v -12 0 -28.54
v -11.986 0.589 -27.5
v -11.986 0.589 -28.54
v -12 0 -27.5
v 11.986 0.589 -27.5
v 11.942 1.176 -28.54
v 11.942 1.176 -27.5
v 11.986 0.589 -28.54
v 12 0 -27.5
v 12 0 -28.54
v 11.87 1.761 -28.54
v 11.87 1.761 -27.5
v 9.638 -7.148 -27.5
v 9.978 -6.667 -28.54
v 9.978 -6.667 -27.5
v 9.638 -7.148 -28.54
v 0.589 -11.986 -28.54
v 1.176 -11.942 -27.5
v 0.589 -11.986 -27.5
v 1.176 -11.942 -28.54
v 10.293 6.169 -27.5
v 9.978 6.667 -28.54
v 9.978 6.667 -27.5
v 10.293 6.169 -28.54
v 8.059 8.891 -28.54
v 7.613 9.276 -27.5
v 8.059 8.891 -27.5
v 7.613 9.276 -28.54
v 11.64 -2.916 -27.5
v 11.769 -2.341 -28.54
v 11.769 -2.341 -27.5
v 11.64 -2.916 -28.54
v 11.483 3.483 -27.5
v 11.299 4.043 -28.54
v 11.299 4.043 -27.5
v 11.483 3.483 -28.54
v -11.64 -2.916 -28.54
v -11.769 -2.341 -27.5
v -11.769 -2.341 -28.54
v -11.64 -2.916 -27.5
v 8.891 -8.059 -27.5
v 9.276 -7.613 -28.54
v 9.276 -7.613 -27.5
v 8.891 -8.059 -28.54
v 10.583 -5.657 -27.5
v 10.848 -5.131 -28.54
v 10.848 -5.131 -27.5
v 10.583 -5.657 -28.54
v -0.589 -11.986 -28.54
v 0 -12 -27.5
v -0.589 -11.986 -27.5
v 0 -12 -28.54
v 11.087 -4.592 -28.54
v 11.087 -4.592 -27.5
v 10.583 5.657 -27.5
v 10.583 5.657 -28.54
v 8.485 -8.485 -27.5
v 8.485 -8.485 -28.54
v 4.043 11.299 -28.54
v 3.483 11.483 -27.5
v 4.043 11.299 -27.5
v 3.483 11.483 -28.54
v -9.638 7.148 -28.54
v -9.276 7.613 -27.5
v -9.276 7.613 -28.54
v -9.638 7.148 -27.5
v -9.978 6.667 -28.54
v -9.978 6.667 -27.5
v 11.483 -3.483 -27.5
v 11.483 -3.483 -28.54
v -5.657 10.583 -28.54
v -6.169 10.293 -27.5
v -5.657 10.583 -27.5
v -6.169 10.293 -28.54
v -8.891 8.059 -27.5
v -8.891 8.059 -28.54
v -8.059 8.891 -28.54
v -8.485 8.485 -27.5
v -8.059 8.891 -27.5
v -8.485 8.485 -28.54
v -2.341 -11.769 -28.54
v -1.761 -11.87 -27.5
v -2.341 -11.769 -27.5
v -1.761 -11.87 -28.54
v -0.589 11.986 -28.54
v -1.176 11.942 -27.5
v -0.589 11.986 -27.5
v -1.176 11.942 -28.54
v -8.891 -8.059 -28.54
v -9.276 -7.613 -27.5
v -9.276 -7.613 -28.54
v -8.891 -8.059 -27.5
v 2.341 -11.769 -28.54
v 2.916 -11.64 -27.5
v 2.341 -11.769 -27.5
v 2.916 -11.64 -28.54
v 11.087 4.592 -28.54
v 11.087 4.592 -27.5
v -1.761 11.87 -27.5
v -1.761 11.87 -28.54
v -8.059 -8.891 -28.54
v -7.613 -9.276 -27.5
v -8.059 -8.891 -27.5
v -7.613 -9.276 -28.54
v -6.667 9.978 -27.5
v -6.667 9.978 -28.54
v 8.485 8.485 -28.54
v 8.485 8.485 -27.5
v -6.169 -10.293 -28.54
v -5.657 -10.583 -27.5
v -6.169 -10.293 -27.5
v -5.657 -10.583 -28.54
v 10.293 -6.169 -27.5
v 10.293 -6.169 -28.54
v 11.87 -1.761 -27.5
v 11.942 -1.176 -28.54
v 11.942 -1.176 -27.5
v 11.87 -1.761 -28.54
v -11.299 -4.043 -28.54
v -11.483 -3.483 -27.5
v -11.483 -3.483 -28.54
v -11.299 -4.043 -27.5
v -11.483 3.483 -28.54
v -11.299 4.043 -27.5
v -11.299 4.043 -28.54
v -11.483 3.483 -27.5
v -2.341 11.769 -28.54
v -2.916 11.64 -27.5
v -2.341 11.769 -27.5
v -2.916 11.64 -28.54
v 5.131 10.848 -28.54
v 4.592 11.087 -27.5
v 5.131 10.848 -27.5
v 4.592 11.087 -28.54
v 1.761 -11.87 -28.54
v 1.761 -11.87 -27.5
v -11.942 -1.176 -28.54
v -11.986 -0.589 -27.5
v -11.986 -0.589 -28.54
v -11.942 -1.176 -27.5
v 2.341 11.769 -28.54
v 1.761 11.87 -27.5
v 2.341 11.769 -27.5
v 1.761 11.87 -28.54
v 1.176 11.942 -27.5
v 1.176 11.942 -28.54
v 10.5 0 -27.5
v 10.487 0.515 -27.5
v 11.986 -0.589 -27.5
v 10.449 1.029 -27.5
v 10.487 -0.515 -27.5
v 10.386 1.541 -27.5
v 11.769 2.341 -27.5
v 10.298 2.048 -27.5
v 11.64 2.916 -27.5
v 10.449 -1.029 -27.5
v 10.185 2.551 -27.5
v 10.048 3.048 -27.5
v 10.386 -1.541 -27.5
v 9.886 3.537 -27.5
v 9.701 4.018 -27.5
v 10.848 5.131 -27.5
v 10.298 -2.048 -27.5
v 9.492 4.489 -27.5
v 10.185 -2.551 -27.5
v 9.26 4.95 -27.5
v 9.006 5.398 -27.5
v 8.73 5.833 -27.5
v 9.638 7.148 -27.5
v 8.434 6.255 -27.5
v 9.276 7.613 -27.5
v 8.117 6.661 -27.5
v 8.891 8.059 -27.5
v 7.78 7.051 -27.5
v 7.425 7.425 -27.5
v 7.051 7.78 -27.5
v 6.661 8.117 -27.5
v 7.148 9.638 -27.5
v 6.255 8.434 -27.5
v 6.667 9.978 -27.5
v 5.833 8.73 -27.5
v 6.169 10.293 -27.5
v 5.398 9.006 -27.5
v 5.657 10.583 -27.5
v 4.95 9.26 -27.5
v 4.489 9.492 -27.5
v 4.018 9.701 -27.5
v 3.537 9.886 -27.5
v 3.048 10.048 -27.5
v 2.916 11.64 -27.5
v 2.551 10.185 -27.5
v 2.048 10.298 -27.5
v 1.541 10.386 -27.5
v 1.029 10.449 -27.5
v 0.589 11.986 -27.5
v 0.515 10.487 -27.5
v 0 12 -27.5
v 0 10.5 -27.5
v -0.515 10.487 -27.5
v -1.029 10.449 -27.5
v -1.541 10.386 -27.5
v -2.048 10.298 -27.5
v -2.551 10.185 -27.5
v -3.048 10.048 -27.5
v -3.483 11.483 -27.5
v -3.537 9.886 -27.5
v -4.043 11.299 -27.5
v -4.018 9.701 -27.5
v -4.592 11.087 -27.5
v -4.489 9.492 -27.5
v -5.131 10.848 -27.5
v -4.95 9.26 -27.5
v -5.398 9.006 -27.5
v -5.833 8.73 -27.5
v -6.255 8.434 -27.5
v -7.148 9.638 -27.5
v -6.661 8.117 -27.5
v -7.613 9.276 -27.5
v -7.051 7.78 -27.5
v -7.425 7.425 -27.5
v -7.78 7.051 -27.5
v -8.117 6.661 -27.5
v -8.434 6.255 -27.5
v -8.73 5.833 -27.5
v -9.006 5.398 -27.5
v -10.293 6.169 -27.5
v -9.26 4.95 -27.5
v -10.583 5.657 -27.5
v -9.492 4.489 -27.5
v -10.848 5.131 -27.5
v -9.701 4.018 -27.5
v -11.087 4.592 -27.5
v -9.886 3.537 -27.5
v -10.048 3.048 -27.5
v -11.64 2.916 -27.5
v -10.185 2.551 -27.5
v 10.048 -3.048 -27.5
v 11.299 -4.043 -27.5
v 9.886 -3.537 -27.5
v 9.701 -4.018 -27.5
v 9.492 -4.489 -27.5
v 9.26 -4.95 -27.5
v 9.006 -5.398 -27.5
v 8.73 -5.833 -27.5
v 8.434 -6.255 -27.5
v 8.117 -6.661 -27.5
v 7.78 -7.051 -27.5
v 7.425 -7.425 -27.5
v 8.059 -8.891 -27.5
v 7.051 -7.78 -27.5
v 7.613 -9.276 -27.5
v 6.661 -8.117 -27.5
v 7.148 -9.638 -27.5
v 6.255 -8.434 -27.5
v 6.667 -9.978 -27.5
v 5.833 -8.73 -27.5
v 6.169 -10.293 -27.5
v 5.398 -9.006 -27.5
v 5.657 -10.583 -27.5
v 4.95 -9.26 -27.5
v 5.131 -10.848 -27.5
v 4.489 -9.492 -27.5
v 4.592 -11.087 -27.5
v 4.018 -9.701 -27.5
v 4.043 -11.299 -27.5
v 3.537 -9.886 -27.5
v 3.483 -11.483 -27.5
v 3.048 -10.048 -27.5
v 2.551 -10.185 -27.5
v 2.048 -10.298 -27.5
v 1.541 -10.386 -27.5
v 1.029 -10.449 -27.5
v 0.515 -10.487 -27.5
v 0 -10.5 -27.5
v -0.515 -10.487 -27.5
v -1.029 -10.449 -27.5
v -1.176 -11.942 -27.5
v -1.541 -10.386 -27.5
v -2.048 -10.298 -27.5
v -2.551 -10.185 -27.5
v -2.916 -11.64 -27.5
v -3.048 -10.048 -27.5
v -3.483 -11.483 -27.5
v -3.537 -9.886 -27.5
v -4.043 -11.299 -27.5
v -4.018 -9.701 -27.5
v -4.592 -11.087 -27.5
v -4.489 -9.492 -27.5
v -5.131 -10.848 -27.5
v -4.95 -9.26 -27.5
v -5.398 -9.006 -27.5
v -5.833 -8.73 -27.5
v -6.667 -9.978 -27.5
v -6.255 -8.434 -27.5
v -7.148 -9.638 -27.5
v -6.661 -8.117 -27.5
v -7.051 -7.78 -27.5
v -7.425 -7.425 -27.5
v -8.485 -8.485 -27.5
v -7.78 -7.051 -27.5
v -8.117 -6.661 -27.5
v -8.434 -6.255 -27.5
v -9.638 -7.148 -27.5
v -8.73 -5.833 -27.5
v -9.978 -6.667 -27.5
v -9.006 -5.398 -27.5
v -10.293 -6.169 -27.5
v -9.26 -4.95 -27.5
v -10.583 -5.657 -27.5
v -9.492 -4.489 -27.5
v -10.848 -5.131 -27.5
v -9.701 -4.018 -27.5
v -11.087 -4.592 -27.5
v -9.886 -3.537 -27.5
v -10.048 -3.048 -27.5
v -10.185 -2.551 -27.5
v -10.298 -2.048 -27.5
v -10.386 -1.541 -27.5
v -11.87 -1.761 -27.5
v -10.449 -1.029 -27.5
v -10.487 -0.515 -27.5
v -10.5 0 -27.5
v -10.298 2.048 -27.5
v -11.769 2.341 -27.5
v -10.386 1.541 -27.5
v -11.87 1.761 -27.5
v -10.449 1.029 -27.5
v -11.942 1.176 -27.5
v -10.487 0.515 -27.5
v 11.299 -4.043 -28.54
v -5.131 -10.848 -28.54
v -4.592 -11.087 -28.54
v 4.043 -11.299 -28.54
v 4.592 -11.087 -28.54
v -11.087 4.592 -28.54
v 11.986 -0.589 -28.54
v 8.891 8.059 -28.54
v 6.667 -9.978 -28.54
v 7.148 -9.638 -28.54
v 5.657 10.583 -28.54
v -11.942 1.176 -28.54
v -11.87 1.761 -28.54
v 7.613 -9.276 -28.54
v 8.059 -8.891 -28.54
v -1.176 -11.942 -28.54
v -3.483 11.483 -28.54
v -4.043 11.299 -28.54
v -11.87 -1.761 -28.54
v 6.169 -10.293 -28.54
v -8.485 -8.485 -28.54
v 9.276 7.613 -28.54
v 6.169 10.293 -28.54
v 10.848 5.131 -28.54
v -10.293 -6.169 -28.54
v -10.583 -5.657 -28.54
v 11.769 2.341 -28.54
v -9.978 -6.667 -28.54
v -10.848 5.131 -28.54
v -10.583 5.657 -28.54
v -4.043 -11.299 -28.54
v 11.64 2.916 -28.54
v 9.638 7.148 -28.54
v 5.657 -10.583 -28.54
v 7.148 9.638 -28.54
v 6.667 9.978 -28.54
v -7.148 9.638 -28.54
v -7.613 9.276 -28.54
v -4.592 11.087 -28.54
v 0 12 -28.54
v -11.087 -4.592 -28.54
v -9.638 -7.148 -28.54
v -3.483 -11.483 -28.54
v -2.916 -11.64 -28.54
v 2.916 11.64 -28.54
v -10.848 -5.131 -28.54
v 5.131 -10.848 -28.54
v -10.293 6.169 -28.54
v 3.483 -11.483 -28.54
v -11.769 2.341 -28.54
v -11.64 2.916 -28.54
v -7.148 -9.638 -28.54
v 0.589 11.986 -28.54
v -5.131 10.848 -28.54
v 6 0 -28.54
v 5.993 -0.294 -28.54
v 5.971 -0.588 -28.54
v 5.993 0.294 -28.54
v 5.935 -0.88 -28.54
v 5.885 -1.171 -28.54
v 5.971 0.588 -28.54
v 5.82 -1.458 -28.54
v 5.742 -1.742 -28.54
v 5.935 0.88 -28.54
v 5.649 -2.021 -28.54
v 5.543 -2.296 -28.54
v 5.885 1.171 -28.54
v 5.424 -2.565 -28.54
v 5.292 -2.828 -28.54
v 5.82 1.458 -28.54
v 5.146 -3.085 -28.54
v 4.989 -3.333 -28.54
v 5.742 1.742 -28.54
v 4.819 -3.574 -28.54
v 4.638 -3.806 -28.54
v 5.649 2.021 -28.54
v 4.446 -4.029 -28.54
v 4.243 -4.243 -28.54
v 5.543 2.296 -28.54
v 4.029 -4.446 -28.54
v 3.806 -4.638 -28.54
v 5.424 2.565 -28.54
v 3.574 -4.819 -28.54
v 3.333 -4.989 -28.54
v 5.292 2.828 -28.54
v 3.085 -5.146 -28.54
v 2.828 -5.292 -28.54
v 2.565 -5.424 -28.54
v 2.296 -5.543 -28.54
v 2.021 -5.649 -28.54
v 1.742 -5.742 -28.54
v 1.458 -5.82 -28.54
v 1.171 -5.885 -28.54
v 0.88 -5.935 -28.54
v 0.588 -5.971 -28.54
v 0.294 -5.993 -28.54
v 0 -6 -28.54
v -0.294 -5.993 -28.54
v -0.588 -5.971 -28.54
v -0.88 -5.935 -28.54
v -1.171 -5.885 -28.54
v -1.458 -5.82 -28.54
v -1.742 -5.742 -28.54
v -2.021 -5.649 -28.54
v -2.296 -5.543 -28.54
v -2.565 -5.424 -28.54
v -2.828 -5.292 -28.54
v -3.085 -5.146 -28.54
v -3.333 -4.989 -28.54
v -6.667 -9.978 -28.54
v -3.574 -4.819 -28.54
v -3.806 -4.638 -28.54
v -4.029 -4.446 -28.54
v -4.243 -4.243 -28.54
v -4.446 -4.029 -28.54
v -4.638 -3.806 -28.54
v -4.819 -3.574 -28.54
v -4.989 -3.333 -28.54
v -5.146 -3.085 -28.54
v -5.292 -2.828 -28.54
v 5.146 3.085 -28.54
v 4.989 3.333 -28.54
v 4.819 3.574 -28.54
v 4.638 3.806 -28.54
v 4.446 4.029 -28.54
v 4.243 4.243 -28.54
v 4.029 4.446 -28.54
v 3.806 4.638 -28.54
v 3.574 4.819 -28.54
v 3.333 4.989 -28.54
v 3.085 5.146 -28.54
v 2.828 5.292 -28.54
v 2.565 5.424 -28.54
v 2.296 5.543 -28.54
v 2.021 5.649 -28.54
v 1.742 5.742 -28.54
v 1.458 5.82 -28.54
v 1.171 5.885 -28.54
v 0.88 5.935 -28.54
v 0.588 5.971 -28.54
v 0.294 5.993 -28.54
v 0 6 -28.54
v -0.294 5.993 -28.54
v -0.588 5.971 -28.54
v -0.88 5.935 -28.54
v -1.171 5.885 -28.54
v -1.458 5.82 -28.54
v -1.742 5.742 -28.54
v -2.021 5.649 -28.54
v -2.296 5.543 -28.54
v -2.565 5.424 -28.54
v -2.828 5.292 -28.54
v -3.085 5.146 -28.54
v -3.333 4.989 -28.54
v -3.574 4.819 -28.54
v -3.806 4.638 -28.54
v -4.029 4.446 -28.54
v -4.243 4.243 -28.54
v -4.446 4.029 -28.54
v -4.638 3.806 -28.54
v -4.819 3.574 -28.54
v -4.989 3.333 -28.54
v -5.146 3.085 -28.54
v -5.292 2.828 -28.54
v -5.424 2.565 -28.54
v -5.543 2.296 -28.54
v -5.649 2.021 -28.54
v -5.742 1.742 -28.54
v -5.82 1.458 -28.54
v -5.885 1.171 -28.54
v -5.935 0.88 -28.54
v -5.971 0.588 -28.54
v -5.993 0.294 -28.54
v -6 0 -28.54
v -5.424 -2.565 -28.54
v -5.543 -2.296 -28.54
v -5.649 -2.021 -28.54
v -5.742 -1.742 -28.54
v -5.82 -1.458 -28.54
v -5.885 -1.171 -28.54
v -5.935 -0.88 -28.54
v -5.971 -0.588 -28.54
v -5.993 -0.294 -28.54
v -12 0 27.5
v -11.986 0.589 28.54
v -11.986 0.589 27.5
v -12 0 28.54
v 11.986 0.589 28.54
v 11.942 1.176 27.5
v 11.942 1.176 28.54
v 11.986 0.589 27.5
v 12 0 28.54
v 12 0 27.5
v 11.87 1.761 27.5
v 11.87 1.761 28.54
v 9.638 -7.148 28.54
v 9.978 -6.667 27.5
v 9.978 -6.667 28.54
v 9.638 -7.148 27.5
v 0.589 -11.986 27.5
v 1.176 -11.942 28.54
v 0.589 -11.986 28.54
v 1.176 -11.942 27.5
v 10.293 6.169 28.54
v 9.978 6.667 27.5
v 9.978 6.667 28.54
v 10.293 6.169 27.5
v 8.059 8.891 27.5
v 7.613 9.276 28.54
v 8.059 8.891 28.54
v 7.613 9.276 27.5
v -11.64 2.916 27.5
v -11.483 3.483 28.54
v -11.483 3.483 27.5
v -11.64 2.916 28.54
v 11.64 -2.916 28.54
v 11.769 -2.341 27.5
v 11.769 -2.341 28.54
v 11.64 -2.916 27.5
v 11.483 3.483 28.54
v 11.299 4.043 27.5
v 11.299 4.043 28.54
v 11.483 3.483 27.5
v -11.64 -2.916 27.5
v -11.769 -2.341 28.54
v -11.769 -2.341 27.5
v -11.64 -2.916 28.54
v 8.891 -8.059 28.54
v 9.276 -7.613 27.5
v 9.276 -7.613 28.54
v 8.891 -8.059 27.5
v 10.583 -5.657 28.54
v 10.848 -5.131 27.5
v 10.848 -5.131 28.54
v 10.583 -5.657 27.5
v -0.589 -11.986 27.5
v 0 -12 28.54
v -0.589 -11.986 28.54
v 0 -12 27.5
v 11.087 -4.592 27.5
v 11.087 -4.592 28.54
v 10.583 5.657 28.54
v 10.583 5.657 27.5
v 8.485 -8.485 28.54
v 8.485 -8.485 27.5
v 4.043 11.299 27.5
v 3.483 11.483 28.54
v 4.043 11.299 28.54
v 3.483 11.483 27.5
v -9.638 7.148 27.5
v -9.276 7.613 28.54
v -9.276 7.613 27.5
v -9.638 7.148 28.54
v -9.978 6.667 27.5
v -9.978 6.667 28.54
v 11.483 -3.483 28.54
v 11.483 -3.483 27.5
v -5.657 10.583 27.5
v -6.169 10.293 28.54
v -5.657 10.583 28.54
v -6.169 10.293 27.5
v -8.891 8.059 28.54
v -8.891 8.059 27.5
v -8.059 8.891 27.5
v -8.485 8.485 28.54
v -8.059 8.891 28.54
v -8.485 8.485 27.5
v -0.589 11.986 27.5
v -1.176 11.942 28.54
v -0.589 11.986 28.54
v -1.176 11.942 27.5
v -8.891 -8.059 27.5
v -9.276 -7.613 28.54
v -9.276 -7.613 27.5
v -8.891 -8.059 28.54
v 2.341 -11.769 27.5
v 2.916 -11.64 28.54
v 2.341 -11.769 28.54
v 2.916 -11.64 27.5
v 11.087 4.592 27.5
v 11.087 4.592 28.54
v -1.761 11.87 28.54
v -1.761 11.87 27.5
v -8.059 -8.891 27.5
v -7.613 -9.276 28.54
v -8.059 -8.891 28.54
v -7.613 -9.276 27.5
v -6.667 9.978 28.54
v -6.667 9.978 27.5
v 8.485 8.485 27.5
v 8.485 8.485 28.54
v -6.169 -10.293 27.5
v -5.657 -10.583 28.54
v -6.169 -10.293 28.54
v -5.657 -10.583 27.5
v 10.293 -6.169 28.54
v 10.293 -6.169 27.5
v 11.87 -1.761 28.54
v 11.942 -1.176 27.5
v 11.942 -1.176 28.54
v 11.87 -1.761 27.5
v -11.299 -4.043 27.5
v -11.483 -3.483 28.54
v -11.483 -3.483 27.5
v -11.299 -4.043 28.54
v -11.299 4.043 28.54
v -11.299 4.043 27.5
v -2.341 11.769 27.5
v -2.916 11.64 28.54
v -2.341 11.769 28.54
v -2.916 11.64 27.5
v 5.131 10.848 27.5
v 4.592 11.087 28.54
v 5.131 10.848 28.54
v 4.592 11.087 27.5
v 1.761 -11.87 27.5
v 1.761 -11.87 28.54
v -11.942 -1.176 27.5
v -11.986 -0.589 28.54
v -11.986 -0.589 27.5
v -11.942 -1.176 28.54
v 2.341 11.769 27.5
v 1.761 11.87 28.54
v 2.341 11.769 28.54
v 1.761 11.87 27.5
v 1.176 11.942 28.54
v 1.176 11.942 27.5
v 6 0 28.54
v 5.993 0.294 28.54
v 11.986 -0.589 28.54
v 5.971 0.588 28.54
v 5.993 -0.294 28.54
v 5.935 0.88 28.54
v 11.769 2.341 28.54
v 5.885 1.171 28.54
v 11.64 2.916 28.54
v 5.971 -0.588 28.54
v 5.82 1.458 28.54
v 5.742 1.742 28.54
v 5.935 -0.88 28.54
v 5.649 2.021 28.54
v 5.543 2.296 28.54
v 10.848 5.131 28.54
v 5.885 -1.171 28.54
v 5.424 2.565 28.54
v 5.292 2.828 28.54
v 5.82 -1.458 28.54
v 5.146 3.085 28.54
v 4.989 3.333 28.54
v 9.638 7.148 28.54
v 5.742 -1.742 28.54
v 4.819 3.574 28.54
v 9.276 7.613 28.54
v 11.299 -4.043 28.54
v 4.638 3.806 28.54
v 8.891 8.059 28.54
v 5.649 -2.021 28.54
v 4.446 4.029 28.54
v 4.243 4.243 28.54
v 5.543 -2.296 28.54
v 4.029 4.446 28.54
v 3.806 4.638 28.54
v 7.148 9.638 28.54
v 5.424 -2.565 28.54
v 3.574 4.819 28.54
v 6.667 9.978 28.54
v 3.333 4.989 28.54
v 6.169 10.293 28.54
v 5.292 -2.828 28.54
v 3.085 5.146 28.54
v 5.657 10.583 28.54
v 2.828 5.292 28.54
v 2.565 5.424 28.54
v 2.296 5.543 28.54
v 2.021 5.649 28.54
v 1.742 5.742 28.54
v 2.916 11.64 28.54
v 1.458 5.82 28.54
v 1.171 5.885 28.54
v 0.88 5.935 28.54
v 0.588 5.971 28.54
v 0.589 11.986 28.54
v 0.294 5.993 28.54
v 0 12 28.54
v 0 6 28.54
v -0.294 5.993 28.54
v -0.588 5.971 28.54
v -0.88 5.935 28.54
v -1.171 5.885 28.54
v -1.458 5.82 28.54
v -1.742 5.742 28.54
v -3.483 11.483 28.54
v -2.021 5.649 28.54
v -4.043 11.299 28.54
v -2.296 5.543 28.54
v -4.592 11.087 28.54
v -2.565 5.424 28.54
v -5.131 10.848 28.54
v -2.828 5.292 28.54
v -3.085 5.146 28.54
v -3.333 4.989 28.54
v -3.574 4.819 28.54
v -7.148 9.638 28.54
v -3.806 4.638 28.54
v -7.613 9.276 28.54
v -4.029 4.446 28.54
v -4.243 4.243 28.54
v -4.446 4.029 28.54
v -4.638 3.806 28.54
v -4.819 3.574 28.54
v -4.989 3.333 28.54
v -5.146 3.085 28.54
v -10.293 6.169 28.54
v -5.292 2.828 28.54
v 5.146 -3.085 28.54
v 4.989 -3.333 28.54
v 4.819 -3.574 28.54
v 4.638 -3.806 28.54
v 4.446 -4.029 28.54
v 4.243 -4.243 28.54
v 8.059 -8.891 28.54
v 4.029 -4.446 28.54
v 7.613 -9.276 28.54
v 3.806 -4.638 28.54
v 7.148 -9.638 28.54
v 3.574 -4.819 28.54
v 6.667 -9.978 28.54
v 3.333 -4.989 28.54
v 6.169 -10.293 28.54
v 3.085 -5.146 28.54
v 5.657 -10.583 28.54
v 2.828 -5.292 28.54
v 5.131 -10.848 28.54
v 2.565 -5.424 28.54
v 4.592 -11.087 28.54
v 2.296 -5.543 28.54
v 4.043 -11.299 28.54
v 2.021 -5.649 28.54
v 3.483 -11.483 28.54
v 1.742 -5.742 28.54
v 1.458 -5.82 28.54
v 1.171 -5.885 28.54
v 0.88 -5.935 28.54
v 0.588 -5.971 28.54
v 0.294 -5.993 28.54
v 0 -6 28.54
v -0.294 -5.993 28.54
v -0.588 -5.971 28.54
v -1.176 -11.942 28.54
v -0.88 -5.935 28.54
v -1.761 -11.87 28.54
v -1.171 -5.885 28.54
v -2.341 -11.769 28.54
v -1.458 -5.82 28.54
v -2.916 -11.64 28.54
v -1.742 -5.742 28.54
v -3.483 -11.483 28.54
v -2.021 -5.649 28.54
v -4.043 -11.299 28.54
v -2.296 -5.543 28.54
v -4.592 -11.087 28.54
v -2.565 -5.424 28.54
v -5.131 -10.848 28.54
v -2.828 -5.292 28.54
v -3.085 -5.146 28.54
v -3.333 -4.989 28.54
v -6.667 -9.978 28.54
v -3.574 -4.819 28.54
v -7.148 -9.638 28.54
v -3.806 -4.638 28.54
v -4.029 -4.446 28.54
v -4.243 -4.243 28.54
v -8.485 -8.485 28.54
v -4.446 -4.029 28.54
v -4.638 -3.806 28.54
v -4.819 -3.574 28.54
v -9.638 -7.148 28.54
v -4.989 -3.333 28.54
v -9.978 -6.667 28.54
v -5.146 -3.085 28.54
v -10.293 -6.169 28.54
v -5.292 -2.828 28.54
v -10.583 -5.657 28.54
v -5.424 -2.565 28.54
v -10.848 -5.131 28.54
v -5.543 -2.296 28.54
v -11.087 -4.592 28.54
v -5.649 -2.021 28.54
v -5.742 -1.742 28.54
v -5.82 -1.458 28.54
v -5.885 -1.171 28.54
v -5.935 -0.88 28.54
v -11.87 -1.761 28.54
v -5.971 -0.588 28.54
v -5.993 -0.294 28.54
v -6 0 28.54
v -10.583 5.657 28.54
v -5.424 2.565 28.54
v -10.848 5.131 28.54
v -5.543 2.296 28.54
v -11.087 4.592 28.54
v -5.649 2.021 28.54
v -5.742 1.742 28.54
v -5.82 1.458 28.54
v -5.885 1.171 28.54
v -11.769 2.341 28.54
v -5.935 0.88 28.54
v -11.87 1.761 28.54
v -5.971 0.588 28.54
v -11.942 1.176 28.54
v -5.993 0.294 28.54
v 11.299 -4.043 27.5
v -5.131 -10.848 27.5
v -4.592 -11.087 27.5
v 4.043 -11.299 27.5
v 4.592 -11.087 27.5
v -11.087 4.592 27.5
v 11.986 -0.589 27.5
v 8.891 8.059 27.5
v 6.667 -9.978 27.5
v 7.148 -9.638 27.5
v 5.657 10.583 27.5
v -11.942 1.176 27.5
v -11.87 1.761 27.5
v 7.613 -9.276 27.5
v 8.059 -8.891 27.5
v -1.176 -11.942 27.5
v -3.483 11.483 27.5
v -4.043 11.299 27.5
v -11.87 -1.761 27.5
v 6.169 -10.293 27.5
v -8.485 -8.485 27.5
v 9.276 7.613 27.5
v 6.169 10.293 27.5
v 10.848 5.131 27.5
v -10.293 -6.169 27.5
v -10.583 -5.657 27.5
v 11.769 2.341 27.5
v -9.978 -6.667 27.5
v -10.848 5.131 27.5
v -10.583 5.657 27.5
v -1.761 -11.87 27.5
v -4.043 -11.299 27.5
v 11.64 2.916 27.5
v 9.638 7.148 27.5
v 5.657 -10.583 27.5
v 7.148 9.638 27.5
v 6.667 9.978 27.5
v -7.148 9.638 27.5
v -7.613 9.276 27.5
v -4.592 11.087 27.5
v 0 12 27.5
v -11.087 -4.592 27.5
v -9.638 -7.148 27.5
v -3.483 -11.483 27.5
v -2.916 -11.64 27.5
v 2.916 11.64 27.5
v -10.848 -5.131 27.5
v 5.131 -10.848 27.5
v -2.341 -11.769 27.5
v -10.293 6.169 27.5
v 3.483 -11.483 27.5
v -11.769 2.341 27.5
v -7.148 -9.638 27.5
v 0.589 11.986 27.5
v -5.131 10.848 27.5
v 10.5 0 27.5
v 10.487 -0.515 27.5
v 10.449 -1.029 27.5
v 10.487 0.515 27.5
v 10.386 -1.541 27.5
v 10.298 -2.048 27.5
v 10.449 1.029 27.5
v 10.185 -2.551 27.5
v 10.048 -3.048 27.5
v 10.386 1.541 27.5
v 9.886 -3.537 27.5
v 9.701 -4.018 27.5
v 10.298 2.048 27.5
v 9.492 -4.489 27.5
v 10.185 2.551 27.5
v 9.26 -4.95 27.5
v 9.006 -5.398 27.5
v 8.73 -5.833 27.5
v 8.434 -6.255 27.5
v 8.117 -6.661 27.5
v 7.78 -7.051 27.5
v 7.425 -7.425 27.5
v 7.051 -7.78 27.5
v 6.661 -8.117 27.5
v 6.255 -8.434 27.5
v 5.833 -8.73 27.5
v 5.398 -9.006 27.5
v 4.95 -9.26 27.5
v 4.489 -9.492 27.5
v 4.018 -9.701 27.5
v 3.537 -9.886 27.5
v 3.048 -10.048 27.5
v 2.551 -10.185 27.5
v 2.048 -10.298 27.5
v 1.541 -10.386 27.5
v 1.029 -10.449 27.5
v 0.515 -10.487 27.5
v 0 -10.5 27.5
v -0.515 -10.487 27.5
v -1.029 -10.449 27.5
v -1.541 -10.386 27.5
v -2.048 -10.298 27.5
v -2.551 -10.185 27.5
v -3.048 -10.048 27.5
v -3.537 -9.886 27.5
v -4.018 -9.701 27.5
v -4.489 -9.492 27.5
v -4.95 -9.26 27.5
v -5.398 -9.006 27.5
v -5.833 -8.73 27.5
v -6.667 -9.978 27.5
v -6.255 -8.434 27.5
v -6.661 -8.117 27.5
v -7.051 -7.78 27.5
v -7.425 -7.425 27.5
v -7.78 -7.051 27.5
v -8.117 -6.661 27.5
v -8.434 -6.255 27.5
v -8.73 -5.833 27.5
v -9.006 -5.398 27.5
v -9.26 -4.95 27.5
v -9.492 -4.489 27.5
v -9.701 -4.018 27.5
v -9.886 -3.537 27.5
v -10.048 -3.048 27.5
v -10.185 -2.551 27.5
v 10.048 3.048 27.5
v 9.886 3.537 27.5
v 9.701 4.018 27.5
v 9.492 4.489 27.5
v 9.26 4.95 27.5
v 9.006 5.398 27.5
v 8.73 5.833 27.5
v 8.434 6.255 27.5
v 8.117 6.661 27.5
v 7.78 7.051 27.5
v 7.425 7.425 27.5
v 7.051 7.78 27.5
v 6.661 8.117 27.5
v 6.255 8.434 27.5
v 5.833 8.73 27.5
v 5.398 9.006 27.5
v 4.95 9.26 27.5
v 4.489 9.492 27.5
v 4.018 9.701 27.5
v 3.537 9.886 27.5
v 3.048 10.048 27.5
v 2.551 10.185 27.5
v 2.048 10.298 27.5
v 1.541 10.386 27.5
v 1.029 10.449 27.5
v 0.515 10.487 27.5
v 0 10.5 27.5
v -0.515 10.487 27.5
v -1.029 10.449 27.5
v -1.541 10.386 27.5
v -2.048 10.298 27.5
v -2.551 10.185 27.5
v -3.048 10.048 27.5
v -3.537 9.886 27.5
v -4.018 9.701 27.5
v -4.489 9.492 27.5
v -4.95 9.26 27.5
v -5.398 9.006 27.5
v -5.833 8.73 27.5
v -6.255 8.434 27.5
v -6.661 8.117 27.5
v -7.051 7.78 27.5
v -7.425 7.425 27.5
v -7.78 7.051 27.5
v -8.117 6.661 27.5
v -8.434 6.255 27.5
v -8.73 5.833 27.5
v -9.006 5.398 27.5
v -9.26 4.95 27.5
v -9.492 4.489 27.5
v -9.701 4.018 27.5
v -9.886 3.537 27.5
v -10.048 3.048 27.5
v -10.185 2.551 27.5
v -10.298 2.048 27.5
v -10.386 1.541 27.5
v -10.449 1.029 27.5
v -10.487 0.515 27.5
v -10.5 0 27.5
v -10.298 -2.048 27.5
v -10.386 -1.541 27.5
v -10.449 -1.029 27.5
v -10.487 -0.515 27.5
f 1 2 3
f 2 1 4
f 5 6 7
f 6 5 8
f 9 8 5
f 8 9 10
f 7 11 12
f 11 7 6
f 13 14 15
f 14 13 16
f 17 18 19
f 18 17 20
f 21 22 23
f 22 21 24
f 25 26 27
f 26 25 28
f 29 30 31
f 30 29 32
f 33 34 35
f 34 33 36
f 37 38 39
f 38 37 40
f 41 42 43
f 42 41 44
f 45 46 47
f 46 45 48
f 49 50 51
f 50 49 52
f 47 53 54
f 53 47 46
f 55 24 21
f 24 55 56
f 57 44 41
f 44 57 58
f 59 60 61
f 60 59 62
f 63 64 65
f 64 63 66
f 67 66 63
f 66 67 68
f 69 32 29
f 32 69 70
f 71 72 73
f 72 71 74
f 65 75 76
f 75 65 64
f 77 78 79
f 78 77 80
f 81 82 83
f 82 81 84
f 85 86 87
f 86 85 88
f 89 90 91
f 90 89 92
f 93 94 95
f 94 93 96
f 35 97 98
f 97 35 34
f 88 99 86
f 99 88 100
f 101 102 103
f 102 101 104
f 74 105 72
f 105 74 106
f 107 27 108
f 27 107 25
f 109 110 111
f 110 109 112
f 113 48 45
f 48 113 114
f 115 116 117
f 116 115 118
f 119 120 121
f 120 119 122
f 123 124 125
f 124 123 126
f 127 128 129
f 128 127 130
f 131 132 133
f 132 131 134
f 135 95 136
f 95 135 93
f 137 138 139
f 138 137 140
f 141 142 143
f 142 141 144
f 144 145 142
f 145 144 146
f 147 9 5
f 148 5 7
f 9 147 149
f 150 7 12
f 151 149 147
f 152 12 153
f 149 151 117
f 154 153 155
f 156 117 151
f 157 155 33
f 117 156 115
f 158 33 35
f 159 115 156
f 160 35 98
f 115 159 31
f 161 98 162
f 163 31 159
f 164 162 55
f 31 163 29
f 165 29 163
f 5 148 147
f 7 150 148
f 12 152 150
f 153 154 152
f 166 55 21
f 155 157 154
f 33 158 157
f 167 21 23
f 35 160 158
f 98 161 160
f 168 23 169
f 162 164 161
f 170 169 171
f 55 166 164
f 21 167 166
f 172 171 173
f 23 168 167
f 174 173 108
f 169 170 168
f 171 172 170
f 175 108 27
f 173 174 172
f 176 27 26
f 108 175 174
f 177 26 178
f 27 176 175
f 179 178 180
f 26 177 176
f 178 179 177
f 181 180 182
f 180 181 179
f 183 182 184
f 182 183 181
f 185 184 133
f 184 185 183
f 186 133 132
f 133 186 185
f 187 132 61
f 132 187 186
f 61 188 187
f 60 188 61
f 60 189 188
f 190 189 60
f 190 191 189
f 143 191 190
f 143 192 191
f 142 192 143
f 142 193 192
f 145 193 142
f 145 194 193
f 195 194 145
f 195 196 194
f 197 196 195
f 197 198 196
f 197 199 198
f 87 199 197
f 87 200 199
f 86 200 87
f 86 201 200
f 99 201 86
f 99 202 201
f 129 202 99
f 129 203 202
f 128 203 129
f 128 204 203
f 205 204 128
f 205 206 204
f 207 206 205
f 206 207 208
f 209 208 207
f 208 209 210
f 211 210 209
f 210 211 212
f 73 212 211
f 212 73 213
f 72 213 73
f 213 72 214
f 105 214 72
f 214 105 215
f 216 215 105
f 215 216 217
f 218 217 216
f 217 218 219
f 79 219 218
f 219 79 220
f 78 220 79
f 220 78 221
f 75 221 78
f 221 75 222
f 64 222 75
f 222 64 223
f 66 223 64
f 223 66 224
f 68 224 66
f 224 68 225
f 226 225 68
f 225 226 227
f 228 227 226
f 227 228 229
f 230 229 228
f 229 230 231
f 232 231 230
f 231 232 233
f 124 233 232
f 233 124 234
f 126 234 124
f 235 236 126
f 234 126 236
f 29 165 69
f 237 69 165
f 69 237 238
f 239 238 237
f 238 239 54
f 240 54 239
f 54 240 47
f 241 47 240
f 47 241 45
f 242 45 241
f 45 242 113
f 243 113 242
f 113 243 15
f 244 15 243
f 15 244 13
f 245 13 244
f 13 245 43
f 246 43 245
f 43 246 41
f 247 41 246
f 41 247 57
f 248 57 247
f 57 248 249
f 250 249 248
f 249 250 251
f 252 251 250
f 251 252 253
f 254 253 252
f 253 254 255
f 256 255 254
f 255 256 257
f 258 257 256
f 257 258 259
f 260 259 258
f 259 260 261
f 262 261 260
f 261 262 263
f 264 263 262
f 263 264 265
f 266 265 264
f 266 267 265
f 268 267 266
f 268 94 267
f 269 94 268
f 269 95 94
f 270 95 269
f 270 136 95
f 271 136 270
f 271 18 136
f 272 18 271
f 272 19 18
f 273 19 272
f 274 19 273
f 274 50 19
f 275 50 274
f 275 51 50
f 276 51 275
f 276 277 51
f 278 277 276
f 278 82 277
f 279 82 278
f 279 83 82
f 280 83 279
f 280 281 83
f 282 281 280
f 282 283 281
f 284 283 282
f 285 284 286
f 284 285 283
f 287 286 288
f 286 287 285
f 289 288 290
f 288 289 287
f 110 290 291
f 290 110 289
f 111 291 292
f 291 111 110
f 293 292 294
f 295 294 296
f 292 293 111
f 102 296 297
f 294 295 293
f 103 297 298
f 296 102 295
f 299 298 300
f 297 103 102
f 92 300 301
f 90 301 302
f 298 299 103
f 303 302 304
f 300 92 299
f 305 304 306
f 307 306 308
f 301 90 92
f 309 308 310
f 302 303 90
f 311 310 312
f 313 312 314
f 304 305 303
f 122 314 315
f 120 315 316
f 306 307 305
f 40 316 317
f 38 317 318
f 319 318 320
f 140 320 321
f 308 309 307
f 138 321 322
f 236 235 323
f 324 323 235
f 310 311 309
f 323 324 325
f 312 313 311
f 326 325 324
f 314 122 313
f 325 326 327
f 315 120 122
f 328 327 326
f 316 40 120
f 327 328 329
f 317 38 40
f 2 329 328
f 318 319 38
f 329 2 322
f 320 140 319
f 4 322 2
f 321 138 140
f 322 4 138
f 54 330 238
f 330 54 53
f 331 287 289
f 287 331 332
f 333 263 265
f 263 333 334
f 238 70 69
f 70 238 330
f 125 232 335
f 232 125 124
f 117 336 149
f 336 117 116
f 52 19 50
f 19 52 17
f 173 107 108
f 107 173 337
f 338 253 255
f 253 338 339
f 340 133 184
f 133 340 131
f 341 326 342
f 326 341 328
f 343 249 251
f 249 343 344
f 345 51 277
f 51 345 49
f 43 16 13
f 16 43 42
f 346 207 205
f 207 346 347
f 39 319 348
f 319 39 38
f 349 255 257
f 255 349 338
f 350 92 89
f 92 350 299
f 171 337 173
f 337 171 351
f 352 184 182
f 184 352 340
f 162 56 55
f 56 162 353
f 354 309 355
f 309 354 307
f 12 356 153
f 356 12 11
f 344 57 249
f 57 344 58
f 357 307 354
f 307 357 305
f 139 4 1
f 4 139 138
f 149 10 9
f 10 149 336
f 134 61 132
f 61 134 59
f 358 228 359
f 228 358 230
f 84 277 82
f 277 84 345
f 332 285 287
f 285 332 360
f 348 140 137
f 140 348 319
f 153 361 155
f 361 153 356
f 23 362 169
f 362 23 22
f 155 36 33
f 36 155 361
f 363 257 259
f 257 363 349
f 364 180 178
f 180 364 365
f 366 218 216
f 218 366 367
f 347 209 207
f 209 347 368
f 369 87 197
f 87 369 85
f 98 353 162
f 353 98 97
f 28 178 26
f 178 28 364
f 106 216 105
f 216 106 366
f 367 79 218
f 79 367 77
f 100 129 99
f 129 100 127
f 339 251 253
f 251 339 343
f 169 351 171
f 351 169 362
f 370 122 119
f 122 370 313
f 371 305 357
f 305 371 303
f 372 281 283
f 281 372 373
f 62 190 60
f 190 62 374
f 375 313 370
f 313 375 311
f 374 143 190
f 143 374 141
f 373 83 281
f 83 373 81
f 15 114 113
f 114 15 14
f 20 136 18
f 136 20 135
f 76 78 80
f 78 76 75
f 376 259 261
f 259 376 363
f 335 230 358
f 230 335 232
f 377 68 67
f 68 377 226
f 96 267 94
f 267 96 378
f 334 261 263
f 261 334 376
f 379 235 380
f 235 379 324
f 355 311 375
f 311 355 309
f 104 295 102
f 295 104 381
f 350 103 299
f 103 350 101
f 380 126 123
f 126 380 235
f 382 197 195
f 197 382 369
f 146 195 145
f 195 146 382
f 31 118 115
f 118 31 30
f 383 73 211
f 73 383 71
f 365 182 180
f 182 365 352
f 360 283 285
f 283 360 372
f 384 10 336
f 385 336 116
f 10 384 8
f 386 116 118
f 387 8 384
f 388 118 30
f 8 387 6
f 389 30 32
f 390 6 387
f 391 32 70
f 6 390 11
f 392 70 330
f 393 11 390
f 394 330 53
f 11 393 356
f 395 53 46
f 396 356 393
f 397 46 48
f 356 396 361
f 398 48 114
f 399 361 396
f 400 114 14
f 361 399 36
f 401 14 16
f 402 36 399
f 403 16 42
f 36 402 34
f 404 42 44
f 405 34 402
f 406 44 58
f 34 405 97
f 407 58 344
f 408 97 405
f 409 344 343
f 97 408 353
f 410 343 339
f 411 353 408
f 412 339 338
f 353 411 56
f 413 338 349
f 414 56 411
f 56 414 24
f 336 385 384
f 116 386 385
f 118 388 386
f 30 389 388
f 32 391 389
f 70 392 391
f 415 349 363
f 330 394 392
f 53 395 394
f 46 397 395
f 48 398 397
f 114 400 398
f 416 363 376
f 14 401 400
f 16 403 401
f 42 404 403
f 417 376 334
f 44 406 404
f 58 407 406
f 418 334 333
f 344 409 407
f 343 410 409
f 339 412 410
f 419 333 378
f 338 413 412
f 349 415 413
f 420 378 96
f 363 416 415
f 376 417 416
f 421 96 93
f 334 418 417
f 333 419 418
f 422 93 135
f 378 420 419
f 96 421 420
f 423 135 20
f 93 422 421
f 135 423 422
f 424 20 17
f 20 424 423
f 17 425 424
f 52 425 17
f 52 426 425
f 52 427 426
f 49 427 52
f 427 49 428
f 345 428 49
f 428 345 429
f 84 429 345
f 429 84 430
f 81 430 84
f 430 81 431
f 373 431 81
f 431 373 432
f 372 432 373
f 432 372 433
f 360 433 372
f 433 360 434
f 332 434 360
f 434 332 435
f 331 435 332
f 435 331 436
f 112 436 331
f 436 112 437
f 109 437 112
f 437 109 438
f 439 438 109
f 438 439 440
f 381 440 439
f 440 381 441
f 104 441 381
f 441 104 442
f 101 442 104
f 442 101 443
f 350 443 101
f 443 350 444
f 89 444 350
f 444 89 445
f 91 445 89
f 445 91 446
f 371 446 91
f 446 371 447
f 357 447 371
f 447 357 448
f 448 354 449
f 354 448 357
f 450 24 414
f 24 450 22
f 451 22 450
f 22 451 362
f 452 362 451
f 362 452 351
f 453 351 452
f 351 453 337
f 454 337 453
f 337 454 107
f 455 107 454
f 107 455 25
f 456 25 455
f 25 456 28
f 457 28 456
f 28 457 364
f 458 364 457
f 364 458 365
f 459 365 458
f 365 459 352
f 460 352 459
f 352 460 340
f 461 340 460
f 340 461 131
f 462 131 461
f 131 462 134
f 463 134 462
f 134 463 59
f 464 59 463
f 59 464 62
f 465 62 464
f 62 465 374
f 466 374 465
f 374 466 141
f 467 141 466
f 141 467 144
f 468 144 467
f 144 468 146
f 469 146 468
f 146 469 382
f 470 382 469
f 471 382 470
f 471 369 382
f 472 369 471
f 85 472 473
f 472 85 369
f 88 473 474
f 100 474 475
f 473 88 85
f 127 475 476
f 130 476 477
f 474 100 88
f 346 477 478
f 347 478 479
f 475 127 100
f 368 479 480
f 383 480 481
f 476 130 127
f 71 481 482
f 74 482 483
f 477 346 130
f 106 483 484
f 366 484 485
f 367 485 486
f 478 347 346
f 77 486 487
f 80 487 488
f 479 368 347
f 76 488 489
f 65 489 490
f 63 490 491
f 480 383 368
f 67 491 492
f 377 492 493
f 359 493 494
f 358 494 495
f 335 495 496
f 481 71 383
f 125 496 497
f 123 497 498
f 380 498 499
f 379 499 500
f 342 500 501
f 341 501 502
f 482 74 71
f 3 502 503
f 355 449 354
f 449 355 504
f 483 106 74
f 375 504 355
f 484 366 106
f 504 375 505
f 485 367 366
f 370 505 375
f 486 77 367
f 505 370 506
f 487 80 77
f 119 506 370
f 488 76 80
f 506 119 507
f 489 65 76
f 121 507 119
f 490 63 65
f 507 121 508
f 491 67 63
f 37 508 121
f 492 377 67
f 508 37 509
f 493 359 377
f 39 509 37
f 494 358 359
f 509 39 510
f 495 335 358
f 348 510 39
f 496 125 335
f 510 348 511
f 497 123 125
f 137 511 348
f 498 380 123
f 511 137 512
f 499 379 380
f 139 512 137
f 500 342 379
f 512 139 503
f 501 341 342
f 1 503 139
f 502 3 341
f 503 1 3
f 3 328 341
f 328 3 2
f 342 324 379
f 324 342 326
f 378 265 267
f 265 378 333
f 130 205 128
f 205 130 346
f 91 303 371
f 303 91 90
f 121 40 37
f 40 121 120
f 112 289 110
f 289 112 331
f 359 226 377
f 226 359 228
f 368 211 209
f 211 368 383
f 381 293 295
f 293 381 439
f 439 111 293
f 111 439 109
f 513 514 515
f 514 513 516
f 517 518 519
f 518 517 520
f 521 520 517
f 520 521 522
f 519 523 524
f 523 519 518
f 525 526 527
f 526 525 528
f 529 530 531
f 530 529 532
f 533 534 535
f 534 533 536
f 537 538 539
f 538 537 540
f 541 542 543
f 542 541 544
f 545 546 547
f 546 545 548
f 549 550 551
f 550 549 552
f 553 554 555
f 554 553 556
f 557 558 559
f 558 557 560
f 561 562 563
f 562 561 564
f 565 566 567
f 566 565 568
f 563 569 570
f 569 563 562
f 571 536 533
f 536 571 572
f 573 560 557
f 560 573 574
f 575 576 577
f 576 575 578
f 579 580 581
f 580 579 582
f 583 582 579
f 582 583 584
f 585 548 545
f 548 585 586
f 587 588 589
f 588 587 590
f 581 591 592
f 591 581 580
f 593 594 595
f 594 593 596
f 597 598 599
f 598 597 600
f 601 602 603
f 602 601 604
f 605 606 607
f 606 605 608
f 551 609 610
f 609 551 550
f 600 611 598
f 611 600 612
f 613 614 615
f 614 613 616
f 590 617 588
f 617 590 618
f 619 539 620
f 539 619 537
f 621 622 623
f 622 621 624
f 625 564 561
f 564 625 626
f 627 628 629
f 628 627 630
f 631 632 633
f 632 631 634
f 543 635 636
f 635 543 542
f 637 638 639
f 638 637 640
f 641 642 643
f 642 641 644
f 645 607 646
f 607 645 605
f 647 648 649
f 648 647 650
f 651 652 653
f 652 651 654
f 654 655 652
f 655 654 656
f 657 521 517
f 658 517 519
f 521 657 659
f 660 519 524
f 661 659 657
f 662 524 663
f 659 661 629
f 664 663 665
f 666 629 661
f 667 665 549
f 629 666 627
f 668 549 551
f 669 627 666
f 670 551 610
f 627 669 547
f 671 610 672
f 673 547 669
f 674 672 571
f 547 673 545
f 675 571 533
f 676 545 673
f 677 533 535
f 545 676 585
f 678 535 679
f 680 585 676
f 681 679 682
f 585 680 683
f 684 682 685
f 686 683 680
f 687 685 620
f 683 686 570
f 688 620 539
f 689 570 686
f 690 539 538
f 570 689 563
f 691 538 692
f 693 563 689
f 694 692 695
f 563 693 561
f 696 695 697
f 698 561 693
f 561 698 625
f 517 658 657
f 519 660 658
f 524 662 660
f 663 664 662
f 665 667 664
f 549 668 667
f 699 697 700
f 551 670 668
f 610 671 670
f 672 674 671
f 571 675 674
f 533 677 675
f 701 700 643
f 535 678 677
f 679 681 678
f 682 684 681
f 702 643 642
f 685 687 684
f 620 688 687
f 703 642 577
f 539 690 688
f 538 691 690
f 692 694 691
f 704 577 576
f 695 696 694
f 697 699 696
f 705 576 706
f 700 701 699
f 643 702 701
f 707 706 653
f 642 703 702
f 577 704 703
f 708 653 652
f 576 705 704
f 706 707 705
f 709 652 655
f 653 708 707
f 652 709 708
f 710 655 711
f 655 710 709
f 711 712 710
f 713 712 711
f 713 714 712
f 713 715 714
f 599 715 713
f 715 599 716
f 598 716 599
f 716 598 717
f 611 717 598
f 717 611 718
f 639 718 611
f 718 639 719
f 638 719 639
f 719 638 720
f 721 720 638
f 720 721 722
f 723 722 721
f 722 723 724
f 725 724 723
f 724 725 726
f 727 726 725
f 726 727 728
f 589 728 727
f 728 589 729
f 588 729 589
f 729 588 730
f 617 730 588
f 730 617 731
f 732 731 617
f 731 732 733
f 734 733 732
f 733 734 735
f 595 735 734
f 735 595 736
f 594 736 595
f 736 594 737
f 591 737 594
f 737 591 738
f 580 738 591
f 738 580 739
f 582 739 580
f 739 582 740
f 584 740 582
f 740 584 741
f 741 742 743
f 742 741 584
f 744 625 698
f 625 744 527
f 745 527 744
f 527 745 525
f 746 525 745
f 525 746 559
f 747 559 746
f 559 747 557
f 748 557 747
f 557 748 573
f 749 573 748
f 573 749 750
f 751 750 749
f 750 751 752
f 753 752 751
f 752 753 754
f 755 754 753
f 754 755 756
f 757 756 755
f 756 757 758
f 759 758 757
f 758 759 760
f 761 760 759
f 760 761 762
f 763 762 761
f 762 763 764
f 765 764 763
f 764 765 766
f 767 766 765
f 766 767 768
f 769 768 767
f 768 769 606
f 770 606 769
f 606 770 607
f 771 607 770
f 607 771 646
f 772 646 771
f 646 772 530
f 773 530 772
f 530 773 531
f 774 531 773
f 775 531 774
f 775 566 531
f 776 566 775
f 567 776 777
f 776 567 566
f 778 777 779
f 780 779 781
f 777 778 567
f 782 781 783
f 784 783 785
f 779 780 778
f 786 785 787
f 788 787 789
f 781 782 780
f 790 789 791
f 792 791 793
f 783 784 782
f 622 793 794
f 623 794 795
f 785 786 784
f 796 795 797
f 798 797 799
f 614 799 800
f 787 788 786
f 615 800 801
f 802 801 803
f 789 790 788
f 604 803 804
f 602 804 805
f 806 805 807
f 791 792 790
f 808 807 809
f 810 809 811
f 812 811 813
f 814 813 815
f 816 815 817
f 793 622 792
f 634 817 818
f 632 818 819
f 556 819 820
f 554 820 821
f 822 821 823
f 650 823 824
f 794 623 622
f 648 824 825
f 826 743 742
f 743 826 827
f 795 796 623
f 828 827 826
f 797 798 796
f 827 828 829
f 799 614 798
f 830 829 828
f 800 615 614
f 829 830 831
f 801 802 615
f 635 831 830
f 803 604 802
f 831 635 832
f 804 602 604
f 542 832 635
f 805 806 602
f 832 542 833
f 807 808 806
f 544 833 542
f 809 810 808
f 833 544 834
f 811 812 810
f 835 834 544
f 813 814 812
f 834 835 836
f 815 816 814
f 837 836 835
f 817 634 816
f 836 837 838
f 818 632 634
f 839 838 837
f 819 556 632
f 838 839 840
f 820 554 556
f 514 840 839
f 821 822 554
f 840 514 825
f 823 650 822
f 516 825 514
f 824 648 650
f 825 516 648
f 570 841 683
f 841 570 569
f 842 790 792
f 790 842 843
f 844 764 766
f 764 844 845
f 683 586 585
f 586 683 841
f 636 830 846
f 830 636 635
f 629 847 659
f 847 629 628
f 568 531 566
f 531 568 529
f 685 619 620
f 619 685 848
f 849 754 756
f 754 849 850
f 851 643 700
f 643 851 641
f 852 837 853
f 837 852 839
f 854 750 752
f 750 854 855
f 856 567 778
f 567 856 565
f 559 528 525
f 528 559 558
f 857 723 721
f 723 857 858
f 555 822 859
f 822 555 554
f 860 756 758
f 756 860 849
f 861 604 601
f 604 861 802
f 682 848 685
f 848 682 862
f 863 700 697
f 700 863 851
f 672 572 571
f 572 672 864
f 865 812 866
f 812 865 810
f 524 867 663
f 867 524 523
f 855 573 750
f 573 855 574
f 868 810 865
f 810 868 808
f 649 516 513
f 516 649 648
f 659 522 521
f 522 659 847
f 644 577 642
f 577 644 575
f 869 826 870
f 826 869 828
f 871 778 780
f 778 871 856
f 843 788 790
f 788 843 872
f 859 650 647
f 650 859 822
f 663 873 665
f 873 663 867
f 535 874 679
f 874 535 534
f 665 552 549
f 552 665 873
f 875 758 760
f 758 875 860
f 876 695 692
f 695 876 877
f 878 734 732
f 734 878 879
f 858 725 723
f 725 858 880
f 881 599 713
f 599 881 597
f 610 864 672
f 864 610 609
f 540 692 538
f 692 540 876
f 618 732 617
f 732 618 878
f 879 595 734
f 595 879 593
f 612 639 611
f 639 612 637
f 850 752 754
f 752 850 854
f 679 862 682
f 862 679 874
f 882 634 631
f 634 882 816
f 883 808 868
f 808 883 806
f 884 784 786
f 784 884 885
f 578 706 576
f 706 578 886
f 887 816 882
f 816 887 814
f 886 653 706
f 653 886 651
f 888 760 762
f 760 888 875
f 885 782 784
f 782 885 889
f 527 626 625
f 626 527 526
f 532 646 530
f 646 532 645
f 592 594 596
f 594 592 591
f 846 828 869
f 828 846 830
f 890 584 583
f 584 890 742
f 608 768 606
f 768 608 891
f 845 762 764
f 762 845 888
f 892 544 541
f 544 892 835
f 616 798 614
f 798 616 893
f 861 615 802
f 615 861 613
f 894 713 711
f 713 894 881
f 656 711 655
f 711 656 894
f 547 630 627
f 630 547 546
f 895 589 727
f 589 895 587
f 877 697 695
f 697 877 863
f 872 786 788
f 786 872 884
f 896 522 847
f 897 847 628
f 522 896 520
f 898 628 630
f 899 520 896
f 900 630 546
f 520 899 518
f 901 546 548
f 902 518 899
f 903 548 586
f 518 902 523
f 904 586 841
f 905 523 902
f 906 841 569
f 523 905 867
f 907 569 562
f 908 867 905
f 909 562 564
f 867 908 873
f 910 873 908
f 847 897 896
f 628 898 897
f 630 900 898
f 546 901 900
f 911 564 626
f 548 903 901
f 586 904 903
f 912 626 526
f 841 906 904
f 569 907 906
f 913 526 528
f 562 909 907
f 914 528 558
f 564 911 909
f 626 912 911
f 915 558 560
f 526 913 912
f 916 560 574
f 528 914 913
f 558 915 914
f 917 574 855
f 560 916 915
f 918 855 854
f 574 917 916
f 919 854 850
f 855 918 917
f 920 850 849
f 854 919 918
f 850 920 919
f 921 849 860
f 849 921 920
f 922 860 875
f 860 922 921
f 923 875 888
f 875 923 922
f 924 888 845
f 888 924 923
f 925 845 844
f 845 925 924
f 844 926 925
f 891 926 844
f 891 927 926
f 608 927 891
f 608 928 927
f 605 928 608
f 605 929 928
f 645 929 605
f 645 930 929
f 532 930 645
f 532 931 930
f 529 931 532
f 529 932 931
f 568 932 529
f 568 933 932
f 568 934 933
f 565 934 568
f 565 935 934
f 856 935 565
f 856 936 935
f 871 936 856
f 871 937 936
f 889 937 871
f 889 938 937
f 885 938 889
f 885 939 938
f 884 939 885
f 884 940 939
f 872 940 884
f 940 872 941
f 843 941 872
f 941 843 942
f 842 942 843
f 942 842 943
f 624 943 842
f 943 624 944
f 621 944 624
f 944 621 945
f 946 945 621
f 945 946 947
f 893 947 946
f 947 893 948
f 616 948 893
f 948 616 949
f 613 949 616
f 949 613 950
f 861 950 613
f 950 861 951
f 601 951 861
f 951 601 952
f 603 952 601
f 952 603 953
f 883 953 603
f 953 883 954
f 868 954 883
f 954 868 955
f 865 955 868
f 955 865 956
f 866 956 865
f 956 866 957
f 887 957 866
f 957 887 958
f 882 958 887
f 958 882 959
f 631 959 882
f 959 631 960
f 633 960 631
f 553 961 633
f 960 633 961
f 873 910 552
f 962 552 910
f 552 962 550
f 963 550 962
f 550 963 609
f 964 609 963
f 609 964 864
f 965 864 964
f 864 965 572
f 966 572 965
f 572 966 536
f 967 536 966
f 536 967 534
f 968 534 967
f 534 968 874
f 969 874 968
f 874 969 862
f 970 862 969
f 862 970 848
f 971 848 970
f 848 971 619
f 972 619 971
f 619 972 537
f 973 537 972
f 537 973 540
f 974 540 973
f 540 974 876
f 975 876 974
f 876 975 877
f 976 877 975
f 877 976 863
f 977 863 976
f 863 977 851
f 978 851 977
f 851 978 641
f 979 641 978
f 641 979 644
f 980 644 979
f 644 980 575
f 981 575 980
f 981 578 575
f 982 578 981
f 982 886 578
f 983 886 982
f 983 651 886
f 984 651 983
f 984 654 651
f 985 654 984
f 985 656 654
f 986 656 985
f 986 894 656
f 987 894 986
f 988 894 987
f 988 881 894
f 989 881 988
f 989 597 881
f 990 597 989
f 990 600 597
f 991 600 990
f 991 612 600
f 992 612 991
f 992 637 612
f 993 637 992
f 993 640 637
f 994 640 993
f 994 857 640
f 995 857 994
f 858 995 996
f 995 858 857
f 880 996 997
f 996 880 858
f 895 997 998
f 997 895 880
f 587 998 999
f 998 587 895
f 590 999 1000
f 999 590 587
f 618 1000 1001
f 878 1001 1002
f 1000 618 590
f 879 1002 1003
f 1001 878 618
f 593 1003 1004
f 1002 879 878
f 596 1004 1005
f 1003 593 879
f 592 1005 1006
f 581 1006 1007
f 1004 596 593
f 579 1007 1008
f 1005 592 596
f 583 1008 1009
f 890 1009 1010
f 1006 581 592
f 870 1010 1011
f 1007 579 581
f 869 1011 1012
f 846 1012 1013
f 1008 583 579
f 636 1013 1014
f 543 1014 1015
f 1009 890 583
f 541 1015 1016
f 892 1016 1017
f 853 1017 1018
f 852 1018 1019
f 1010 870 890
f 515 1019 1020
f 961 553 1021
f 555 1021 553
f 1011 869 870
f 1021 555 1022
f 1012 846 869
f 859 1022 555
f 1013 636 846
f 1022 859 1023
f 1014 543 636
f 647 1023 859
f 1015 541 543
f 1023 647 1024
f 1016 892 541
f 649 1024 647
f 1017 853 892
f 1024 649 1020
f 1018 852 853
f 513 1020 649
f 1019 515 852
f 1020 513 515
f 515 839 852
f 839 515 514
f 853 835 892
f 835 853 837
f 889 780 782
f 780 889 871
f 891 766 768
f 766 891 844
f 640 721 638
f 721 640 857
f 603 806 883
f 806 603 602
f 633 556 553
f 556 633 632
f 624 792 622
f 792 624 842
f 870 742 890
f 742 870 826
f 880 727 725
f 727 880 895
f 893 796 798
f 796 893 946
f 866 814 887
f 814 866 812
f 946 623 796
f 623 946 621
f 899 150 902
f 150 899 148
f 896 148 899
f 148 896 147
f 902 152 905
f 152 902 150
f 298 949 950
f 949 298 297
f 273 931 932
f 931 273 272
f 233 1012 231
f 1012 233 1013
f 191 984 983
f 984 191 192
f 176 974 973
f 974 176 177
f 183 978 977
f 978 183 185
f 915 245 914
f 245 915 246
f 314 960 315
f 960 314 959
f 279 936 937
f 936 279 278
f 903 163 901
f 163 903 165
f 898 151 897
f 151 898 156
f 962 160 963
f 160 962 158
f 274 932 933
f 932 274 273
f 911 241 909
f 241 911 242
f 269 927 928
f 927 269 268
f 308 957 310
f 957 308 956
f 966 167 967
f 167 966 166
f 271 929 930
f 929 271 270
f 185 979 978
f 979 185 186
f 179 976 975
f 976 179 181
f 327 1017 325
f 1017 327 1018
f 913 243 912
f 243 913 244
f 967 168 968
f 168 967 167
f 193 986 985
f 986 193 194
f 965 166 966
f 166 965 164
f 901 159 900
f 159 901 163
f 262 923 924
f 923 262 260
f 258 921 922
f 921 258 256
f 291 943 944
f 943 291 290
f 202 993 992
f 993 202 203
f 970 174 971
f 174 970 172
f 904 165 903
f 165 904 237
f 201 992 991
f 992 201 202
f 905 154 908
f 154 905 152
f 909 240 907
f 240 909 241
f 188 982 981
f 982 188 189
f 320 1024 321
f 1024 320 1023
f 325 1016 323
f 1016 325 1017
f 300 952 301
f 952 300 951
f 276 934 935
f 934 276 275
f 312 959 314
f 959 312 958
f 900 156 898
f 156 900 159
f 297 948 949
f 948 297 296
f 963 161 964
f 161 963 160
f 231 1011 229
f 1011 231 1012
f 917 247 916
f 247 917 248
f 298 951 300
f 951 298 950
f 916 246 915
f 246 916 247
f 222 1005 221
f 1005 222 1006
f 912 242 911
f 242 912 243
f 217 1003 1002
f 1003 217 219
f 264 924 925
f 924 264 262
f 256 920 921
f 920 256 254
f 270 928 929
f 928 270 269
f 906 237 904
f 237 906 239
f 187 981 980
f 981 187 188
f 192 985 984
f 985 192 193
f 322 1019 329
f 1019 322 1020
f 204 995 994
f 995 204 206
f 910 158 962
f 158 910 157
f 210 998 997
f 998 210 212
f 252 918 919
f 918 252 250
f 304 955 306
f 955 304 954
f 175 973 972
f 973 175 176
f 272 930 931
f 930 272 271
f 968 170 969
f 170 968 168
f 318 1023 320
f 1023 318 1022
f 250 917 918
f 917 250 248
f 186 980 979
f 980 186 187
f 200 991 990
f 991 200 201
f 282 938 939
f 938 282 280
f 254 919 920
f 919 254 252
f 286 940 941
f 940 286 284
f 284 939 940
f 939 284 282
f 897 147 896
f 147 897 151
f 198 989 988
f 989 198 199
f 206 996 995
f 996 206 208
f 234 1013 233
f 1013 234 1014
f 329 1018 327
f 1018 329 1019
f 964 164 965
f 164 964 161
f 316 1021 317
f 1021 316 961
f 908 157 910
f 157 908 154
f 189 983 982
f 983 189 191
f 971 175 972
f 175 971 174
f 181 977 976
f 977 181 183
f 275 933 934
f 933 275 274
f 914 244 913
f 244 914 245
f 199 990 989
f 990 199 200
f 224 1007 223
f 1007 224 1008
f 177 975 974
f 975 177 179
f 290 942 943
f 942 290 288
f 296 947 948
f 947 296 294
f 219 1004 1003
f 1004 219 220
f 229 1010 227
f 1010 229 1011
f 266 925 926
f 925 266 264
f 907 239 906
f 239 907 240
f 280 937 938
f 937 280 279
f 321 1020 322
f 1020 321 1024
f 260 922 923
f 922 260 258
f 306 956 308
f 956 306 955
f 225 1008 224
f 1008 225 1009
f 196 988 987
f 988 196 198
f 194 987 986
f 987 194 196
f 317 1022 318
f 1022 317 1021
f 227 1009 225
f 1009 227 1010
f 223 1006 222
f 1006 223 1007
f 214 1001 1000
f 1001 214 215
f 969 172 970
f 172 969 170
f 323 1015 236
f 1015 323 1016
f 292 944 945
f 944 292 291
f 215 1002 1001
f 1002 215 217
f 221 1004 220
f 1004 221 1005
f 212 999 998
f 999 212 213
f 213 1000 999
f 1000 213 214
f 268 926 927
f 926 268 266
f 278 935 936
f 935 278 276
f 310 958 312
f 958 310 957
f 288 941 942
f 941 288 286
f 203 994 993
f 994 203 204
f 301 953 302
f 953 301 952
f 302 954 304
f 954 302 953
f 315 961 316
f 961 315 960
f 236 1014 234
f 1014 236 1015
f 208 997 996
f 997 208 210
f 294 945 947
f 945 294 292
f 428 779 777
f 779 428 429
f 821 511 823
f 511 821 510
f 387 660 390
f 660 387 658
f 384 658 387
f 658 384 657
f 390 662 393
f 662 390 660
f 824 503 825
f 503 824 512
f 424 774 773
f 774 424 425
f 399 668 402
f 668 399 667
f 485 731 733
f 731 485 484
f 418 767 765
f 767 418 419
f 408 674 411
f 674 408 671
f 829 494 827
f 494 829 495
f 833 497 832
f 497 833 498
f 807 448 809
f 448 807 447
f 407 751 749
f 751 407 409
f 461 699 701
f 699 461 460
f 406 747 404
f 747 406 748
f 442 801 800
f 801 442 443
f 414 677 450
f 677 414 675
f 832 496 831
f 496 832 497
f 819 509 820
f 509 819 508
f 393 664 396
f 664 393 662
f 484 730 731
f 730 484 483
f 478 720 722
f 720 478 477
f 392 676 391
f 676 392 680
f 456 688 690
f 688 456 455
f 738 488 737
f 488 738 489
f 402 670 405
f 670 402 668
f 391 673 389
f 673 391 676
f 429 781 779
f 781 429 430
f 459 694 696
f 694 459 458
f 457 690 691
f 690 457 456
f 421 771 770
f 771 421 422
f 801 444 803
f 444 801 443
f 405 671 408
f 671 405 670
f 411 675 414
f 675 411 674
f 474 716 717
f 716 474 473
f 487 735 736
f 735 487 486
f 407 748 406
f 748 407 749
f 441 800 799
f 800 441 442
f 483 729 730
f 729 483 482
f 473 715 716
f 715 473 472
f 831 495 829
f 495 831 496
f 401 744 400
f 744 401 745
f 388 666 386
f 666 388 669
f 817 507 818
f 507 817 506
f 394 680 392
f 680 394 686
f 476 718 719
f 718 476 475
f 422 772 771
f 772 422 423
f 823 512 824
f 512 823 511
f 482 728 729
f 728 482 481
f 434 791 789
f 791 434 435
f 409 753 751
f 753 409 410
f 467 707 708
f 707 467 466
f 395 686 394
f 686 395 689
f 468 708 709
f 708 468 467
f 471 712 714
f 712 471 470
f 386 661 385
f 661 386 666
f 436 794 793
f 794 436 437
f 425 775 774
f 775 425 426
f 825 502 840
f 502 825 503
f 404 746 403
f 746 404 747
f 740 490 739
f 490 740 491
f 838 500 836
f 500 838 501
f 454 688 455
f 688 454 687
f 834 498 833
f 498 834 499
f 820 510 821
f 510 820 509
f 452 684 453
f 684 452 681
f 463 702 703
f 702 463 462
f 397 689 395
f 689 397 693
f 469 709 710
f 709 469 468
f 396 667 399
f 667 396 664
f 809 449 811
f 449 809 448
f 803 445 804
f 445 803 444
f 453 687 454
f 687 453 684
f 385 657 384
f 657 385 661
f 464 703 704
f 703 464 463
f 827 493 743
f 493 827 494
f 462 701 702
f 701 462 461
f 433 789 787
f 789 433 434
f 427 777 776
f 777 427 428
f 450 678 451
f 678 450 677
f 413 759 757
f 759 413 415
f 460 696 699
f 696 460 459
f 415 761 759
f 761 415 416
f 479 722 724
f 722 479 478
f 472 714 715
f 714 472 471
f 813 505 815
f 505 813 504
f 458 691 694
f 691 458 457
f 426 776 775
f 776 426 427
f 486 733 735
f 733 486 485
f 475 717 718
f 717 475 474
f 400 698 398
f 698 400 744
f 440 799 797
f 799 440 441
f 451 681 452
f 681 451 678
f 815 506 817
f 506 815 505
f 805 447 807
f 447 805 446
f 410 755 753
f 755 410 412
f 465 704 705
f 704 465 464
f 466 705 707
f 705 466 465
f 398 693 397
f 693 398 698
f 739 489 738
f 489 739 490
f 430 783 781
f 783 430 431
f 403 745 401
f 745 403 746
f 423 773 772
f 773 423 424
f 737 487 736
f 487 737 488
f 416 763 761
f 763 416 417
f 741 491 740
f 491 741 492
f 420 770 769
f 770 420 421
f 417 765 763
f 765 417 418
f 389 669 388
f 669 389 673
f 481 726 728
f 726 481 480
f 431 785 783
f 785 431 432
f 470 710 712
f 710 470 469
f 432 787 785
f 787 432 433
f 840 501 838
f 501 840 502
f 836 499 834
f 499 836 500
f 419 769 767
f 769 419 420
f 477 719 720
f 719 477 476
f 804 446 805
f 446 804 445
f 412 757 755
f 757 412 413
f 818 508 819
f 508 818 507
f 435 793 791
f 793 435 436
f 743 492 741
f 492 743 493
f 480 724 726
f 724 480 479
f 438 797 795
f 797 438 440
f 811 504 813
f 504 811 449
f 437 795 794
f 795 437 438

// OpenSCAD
$fn = 128;

// Target dimensions (mm)
outer_diameter = 21.0;   // OD
inner_diameter = 12.0;   // ID (bore)
length         = 57.0;   // overall length

// Small end lips (kept within overall length)
lip_thickness  = 1.0;    // axial thickness per end
lip_extension  = 1.5;    // radial extension beyond OD

// Robust boolean overlap to avoid coincident faces
eps = 0.02;

module linear_bearing() {
    difference() {
        // ONE connected solid: outer body + end lips unioned
        union() {
            // Main outer cylinder spans full length
            cylinder(d=outer_diameter, h=length, center=true);

            // End lips placed at the ends, overlapping slightly into the body
            for (z = [-1, 1]) {
                translate([0, 0, z*(length/2 - lip_thickness/2 + eps)])
                    cylinder(d=outer_diameter + 2*lip_extension,
                             h=lip_thickness + 2*eps,
                             center=true);
            }
        }

        // Through bore (clearly visible in end views)
        cylinder(d=inner_diameter, h=length + 2*lip_thickness + 4*eps, center=true);
    }
}

linear_bearing();
